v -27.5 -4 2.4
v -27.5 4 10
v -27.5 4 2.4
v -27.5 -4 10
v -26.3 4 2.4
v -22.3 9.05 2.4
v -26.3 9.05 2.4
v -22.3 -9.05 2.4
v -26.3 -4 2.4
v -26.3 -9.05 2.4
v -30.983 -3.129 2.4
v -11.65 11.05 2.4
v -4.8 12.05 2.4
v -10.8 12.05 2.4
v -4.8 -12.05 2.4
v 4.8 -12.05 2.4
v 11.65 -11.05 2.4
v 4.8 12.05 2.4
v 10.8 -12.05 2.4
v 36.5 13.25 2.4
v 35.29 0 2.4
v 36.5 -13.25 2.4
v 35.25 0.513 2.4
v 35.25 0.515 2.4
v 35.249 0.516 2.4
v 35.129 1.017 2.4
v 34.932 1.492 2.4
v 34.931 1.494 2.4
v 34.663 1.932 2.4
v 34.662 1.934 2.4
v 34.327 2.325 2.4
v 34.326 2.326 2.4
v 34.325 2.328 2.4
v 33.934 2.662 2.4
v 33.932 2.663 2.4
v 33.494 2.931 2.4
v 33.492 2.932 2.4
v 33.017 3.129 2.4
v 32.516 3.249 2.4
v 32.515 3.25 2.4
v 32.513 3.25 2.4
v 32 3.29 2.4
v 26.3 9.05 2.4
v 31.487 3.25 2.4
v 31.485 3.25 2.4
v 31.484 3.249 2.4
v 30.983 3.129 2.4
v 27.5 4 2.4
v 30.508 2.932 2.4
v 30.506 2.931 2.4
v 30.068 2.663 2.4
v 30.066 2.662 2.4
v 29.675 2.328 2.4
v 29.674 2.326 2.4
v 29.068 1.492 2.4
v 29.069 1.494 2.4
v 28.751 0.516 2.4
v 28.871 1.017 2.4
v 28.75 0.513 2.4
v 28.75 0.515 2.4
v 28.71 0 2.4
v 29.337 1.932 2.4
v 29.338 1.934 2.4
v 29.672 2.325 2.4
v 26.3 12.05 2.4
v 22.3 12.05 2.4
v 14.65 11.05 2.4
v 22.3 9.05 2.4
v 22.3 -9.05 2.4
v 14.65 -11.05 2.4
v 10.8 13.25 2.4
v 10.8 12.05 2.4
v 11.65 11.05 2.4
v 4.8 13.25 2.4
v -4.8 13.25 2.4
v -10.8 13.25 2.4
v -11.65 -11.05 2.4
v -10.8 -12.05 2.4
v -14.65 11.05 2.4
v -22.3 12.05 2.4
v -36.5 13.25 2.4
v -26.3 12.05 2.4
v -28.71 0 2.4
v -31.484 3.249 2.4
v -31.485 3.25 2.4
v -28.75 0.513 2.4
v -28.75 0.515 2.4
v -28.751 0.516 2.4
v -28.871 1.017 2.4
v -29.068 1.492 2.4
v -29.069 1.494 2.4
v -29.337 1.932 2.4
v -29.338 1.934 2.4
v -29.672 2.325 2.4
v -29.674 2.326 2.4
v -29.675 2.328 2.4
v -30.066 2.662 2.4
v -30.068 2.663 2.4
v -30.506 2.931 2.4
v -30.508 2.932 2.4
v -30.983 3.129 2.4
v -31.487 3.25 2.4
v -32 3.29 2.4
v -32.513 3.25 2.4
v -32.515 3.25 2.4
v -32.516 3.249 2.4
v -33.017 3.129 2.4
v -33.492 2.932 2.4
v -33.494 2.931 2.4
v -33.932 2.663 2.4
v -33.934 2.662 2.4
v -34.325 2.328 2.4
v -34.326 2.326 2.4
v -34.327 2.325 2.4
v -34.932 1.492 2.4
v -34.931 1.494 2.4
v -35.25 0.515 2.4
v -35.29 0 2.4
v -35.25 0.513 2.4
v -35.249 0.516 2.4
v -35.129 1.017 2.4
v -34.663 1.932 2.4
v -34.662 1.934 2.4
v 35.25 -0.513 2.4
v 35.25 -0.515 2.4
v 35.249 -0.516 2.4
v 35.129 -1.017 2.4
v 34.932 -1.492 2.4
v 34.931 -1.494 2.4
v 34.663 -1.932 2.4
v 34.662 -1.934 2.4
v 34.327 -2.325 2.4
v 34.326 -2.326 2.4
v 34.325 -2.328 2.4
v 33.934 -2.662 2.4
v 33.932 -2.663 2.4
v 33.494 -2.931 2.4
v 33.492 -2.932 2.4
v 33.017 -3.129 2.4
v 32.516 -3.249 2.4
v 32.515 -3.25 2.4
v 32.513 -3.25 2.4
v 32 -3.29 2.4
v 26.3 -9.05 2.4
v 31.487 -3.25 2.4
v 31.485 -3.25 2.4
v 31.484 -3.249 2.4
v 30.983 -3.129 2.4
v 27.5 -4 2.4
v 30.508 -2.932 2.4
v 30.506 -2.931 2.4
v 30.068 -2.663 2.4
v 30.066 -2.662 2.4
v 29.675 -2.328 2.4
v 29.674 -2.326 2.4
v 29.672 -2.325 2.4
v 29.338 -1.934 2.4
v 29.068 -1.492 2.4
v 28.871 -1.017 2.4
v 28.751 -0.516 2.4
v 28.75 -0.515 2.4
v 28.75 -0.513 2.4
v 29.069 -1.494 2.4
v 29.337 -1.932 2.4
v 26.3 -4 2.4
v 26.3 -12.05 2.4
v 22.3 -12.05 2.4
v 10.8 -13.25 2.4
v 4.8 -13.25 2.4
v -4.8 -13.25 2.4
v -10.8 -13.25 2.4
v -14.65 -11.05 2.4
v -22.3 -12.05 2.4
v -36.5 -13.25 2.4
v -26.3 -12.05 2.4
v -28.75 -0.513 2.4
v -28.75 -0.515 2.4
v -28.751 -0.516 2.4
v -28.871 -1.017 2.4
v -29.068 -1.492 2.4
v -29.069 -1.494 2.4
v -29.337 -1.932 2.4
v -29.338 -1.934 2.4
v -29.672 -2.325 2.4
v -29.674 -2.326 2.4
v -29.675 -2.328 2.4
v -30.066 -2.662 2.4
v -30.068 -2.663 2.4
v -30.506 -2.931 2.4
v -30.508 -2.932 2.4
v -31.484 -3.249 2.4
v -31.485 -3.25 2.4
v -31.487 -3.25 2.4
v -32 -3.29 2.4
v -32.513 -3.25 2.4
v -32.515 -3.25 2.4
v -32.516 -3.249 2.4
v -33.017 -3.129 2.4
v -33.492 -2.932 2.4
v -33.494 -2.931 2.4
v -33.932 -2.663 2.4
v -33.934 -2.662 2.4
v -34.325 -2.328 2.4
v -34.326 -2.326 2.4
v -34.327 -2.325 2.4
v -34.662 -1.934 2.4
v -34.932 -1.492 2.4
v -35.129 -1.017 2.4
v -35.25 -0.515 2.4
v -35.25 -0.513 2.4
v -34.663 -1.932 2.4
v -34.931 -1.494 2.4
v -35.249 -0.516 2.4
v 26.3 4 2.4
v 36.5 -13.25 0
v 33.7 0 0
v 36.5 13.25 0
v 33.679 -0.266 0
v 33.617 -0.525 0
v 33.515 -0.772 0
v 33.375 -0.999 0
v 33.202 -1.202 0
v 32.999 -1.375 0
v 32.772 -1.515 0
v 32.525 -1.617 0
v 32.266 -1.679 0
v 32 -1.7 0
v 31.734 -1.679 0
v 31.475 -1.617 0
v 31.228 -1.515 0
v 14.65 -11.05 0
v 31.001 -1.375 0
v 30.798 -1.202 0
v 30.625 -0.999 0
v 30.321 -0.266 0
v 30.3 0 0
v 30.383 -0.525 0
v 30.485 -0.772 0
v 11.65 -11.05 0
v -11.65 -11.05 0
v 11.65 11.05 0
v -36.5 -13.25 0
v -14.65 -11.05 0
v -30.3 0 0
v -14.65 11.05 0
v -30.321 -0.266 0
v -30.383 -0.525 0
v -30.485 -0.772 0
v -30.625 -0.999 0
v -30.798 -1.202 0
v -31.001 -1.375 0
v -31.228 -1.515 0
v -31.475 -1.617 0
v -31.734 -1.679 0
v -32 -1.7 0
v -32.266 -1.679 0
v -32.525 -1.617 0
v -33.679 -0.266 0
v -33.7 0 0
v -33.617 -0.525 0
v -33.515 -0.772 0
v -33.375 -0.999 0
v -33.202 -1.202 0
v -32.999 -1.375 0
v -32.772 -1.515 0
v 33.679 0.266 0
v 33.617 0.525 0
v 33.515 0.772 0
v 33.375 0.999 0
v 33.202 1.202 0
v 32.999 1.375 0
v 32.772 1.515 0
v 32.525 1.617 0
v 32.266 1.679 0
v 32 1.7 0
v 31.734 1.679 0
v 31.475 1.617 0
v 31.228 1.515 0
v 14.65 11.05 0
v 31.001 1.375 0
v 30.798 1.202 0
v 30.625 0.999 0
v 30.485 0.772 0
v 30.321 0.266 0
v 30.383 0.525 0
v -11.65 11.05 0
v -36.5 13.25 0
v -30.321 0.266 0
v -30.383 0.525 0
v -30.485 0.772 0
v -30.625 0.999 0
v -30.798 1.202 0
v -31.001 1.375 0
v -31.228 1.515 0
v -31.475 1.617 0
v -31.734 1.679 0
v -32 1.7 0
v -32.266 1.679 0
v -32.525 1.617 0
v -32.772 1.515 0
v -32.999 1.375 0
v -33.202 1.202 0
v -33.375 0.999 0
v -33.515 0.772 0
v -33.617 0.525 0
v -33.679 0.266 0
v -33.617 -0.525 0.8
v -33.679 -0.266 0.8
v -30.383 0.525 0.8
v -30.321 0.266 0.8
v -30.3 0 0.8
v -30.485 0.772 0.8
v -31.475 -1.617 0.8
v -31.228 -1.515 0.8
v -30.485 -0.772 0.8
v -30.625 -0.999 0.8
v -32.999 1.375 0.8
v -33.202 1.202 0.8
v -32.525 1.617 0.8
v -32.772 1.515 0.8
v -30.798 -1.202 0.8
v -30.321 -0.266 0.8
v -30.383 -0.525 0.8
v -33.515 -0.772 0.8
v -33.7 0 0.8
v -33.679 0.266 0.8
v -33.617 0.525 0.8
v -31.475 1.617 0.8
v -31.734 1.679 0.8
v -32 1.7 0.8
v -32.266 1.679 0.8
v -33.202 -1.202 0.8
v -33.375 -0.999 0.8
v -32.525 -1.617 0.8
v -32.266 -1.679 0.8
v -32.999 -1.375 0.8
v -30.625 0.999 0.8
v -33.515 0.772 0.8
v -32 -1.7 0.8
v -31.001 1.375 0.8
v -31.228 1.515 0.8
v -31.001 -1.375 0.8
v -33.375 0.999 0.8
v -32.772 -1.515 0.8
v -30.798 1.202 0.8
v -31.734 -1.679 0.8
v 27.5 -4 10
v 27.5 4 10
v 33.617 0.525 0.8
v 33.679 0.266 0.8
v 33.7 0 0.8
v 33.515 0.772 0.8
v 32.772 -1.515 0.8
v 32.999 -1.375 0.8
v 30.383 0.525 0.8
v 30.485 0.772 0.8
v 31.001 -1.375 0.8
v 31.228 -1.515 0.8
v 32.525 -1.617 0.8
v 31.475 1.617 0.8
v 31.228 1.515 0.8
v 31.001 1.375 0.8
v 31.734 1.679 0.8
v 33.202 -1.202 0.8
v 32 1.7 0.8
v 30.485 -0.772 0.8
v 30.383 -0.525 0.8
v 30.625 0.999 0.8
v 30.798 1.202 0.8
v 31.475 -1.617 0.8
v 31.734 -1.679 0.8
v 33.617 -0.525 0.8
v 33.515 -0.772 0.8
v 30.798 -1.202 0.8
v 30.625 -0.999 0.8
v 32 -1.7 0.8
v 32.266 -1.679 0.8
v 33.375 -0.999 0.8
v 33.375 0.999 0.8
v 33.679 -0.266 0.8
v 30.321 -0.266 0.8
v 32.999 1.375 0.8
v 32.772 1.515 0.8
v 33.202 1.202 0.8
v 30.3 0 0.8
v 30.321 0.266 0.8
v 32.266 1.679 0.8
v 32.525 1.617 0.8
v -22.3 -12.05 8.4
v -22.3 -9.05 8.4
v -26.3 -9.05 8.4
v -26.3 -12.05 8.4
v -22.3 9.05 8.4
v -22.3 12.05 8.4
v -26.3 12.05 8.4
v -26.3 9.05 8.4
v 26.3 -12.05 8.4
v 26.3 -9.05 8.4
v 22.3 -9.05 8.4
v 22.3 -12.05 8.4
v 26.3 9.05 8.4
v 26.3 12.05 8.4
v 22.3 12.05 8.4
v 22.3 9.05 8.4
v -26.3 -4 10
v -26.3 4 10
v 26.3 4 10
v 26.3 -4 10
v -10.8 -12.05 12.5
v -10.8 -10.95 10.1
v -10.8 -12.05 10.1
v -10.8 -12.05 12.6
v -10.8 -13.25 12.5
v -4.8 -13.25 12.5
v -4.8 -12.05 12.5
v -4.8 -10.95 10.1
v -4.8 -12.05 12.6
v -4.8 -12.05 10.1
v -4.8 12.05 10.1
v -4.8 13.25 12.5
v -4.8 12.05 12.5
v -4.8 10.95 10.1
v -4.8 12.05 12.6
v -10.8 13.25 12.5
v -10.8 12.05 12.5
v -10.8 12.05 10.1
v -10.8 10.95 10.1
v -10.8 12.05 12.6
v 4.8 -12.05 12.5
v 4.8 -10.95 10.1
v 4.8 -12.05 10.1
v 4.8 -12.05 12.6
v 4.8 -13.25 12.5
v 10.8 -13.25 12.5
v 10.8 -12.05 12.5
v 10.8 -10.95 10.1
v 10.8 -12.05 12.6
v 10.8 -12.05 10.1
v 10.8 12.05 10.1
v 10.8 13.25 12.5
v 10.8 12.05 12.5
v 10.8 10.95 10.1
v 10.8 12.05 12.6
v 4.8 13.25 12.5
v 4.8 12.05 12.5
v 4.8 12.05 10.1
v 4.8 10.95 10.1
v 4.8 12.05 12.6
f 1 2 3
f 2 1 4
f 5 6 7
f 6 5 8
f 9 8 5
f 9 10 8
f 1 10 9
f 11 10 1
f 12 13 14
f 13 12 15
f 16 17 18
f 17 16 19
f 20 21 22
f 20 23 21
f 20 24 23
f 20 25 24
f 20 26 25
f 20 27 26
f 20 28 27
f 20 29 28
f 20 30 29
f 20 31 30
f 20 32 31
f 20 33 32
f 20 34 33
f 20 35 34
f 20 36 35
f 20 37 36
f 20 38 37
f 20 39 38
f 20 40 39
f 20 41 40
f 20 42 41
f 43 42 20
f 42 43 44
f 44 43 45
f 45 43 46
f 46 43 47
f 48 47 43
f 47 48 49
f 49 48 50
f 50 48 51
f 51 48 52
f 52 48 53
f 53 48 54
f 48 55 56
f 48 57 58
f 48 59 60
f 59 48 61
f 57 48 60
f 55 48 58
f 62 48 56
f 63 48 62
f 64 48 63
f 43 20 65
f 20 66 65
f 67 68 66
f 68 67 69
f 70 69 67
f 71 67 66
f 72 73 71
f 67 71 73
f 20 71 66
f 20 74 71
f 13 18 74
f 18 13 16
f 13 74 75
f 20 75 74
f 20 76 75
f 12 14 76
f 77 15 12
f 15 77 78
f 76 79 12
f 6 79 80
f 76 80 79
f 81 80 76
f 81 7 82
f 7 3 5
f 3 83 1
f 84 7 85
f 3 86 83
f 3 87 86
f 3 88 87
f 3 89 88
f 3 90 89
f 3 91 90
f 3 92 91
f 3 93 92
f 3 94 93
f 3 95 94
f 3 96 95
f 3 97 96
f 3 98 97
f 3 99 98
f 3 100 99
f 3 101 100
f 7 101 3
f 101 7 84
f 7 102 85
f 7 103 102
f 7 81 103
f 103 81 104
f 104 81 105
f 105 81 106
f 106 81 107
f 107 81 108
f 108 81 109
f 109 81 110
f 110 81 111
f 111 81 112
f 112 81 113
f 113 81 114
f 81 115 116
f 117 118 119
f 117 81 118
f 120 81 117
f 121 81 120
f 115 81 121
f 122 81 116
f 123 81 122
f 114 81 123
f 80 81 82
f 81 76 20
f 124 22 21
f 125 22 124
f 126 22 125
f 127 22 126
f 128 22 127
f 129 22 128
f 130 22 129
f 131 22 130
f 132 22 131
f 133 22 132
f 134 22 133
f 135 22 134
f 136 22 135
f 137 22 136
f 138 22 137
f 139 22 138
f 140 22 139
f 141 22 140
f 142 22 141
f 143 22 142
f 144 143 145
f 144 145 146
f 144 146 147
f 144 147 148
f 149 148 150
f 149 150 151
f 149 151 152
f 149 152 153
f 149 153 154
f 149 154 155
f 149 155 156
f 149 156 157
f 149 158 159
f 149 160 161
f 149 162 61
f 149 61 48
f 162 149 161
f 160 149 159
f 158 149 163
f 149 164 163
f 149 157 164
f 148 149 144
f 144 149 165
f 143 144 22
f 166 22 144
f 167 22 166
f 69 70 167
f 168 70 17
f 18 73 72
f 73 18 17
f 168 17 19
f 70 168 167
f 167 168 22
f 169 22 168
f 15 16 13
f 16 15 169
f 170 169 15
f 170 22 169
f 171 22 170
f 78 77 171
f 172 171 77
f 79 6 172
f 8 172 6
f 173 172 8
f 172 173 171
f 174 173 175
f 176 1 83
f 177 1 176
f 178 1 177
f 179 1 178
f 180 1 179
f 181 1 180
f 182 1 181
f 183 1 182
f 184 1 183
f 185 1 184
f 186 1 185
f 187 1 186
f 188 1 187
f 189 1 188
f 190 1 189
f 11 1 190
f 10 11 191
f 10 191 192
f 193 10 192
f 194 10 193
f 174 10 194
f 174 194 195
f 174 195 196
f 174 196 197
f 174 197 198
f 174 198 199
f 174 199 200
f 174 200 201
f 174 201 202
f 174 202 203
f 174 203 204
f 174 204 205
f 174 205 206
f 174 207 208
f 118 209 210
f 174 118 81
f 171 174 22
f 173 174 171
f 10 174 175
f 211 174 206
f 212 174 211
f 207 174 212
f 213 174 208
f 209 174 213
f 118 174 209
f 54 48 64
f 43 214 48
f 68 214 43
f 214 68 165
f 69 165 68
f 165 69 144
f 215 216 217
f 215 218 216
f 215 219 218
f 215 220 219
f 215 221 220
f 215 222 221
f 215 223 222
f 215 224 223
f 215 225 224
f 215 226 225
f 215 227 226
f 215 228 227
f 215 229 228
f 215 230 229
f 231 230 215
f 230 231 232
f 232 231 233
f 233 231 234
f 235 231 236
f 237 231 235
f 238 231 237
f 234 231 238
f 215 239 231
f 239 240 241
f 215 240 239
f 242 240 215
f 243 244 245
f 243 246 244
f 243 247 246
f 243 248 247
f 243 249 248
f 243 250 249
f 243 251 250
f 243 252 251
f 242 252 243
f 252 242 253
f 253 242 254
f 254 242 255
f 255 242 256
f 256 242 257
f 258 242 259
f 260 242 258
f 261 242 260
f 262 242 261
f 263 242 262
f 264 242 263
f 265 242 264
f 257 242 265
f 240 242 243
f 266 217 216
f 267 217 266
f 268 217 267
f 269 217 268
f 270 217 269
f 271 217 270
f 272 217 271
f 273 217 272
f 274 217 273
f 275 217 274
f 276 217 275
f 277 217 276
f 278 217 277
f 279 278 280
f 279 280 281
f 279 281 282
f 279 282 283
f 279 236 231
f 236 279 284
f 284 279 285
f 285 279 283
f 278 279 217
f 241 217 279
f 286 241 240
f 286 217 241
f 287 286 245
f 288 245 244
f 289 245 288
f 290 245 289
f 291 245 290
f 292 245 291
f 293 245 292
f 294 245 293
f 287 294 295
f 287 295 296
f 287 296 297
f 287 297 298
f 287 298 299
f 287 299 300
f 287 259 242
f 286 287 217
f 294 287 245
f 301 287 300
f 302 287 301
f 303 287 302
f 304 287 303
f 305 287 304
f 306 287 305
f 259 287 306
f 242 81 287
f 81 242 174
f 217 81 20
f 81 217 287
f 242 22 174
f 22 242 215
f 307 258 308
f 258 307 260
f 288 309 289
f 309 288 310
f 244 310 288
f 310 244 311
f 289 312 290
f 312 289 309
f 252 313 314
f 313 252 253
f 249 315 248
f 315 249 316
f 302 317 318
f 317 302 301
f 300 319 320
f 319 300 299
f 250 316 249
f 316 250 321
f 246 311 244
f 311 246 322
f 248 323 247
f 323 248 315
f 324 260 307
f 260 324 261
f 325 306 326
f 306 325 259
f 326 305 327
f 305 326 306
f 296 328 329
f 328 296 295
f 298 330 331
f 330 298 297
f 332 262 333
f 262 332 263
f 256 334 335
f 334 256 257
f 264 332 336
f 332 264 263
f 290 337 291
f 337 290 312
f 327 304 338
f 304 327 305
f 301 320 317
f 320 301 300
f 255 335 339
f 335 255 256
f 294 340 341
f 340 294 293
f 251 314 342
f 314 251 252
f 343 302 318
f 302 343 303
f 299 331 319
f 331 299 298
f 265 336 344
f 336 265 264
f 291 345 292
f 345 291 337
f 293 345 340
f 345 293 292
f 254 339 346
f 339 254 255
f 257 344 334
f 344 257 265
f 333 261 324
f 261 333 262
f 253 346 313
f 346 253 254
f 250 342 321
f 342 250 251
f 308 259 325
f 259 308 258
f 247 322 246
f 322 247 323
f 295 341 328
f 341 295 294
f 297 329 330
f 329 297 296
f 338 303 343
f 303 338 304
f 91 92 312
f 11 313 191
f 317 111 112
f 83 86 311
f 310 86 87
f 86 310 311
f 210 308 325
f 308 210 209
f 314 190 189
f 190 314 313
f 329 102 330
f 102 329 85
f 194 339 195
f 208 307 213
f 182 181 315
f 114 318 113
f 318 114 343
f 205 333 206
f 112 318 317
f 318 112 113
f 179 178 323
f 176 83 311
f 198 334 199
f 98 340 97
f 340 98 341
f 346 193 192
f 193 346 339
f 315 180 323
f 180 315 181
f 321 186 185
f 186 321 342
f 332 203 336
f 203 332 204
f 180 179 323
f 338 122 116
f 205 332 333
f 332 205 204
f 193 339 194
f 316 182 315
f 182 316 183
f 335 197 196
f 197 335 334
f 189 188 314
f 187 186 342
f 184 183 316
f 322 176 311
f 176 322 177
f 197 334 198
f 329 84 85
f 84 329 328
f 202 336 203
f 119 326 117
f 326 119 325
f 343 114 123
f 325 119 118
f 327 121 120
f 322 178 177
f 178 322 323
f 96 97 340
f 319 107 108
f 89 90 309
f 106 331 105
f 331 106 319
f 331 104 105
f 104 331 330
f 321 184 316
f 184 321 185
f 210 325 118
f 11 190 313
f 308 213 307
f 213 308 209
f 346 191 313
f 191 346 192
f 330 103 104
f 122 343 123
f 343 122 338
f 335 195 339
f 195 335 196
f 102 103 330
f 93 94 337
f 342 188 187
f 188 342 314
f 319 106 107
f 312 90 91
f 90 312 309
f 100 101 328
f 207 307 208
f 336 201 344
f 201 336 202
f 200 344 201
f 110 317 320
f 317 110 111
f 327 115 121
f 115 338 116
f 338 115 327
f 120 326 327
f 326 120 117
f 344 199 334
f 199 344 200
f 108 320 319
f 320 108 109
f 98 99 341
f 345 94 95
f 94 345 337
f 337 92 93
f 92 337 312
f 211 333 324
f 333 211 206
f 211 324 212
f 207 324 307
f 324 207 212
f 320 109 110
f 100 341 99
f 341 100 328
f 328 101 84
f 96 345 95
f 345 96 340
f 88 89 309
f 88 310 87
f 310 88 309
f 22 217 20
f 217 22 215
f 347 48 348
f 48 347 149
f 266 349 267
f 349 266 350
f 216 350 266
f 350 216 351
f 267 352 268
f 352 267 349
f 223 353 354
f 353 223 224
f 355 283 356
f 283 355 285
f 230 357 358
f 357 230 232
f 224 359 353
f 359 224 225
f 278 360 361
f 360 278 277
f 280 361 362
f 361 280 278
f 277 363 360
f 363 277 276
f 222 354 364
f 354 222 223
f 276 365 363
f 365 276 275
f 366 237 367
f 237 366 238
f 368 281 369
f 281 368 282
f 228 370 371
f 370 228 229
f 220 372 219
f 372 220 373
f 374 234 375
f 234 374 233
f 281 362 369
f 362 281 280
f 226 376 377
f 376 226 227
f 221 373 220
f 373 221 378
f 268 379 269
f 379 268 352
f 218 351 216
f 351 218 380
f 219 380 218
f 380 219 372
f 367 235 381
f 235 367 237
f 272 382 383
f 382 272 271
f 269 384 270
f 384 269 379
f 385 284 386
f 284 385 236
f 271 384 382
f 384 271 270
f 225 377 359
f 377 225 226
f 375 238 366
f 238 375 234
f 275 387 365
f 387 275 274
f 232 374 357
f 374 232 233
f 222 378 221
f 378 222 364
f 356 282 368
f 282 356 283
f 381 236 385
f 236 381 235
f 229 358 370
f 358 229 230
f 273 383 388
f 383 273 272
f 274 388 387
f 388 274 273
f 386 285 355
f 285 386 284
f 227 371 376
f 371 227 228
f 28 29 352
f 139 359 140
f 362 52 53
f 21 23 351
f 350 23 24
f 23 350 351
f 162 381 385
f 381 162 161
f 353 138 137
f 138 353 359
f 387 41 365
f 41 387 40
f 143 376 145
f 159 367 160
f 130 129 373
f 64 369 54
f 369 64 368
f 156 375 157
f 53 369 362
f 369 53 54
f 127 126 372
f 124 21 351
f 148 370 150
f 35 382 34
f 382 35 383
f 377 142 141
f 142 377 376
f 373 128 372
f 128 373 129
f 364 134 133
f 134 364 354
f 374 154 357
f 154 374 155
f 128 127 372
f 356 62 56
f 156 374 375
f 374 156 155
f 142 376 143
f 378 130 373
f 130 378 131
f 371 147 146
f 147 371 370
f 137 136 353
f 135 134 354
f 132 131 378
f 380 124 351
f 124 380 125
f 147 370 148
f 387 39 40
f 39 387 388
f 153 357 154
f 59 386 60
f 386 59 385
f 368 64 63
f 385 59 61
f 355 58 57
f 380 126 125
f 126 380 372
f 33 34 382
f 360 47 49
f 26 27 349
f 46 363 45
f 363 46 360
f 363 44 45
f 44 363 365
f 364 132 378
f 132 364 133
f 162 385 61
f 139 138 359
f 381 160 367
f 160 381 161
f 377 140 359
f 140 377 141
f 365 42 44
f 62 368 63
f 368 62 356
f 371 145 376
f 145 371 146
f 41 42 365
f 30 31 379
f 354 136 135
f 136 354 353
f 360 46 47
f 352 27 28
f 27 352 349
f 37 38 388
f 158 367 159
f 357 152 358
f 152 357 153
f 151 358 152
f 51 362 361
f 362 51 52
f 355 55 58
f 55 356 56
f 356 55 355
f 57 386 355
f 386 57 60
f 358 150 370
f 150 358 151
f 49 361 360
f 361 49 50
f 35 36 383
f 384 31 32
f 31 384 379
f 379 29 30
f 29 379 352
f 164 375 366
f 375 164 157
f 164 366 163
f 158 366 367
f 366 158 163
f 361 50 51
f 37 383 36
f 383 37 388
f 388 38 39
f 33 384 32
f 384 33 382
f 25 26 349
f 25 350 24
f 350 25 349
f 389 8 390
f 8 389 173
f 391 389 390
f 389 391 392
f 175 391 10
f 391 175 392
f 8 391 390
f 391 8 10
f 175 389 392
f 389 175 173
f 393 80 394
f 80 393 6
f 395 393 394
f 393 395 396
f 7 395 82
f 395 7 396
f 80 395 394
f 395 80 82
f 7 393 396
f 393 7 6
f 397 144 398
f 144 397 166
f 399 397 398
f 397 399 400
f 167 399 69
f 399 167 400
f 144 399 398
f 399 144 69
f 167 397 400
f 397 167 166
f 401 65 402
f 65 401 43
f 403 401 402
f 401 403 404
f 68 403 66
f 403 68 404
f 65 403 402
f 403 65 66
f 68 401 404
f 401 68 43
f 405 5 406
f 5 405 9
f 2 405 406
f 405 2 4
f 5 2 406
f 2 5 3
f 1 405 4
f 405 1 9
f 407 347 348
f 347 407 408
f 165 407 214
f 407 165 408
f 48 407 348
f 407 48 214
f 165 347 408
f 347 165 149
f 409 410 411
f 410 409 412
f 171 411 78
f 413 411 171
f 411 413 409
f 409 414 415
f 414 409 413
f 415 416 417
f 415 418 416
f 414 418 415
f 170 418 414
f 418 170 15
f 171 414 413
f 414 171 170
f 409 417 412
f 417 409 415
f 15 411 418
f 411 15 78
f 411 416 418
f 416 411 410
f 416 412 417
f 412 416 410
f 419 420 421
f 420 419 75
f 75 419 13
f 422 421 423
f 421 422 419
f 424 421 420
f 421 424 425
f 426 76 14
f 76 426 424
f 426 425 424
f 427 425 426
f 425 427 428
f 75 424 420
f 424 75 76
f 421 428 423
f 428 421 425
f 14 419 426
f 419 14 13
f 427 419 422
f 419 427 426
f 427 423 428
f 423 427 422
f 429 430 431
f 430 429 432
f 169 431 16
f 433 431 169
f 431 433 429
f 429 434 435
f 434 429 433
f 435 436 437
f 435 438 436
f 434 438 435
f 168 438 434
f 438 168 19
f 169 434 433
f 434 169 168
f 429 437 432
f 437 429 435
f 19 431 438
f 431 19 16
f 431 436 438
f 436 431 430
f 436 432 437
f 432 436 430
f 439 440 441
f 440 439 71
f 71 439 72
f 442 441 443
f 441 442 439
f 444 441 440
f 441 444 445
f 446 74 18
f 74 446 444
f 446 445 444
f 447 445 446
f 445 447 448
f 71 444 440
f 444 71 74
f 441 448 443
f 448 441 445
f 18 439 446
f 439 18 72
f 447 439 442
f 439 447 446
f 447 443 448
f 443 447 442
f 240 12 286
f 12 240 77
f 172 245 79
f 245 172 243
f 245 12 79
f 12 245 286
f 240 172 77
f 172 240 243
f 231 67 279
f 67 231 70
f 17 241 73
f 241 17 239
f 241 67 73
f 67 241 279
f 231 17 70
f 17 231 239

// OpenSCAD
// Snap-in holders for Bailey's small boards: no glue, no holes in the board.
//
// pcb_clip()  boards without mounting holes (buck converter, ...): the board
//             rests on corner pads and clicks in under flexible hooks on its
//             long sides; end stops stop it sliding. The holder screws to a
//             shelf with two M3 screws (or a cable tie through the slots).
// pcb_posts() boards with mounting holes (ESP32-S3-Pico, GY-521, ...): posts
//             with pilot holes for small self-tapping screws.
//
// Measure the board with calipers (length, width, thickness) and check where
// its components sit at the edges: the hooks overlap the top of the board by
// `lip`, so put them (`hooks`, fractions of the length) where the edge is
// free. Print flat, base down, PLA or PETG, 0.2 mm layers, no supports.
// Stepper drivers: don't clip them, plug them into the carrier boards, which
// have screw holes and the filter capacitor the driver needs.
//
// Pick the part to export (F6, then File > Export > STL):
part = "buck";          // "buck", "esp32", "test"

$fn = 40;

// ---------- boards ----------

if (part == "buck")
    // XL4015-type buck converter (the blue one with two 220 uF capacitors).
    // These sizes are estimates from a photo: measure yours.
    pcb_clip(l = 52, w = 23.5, t = 1.6, hooks = [-0.15, 0.15]);

if (part == "esp32")
    // Waveshare ESP32-S3-Pico (Raspberry Pi Pico layout: 51 x 21 mm, M2 holes
    // 47 x 11.4 mm apart). Check against your board.
    pcb_posts(l = 51, w = 21, holes = [[-23.5, -5.7], [-23.5, 5.7], [23.5, -5.7], [23.5, 5.7]], pilot = 1.7);

if (part == "test")
    // A short strip to check the fit and the hook's snap before printing the
    // whole holder: same width and thickness, 20 mm long.
    pcb_clip(l = 20, w = 23.5, t = 1.6, hooks = [0], ears = false);

// ---------- holder for boards without holes ----------

// l, w, t     board length, width, thickness (mm)
// gap         space under the board for solder joints and pins
// clear       play around the board
// lip         how far each hook reaches over the board's edge
// hooks       hook positions along each long side, as fractions of l (-0.5..0.5)
// ears        M3 screw tabs at both ends
module pcb_clip(l, w, t = 1.6, gap = 6, clear = 0.3, lip = 0.8, hooks = [-0.25, 0.25],
                ears = true, base = 2.4, arm = 1.2, hook_w = 6, hook_h = 2.5) {
    L = l + 2 * clear;              // pocket
    W = w + 2 * clear;
    top = base + gap;               // board's underside
    wall = arm;
    difference() {
        union() {
            // base plate
            translate([-L / 2 - wall, -W / 2 - wall, 0]) cube([L + 2 * wall, W + 2 * wall, base]);
            if (ears) for (s = [-1, 1]) ear(s * (L / 2 + wall), base, W + 2 * wall);
            // corner pads the board rests on
            for (sx = [-1, 1], sy = [-1, 1])
                translate([sx * (L / 2 - 2) - 2, sy * (W / 2 - 1.5) - 1.5, 0]) cube([4, 3, top]);
            // end stops, as high as the board
            for (sx = [-1, 1])
                translate([sx * (L / 2 + wall / 2) - wall / 2, -min(8, W / 3) / 2, 0])
                    cube([wall, min(8, W / 3), top + t]);
            // flexible hooks on the long sides
            for (f = hooks, sy = [-1, 1])
                translate([f * l, sy * (W / 2 + arm / 2), 0])
                    rotate([0, 0, sy > 0 ? 0 : 180]) hook(top + t, arm, hook_w, lip + clear, hook_h);
        }
        // slots in the base for a cable tie, as an alternative to the screws
        for (sx = [-1, 1])
            translate([sx * L / 4 - 1.5, -W / 2 + 1, -1]) cube([3, W - 2, base + 2]);
    }
}

// One hook: an arm standing on the plate, with a sloped catch at the top that
// the board pushes outwards on its way down and then sits under. Built for the
// +y side (catch pointing towards -y).
module hook(height, arm, width, reach, hook_h) {
    translate([-width / 2, -arm / 2, 0]) cube([width, arm, height + hook_h]);
    // catch: flat underside at the board's top, slope above it
    translate([-width / 2, -arm / 2, height + 0.1])
        rotate([90, 0, 90]) linear_extrude(width)
            polygon([[0, 0], [-reach, 0], [0, hook_h]]);
}

// M3 screw tab at x (the plate's end), countersunk from the top.
module ear(x, base, w) {
    s = sign(x);
    difference() {
        translate([x + (s > 0 ? 0 : -9), -w / 2, 0]) cube([9, w, base]);
        translate([x + s * 4.5, 0, -1]) cylinder(d = 3.4, h = base + 2);
        translate([x + s * 4.5, 0, base - 1.6]) cylinder(d1 = 3.4, d2 = 6.6, h = 1.61);
    }
}

// ---------- posts for boards with holes ----------

// holes      hole centres relative to the board's centre
// pilot      hole in the post for a self-tapping screw: 1.7 for M2, 2.2 for
//            M2.5, 2.6 for M3 (or the heat-set insert's size)
module pcb_posts(l, w, holes, pilot = 2.2, gap = 6, post = 5.5, base = 2.4, ears = true) {
    difference() {
        union() {
            translate([-l / 2, -w / 2, 0]) cube([l, w, base]);
            if (ears) for (s = [-1, 1]) ear(s * l / 2, base, w);
            for (h = holes) translate([h[0], h[1], 0]) cylinder(d = post, h = base + gap);
        }
        for (h = holes) translate([h[0], h[1], 1]) cylinder(d = pilot, h = base + gap);
        // weight and airflow: a window between the posts
        translate([-l / 2 + 7, -w / 2 + 4, -1]) cube([l - 14, w - 8, base + 2]);
    }
}
